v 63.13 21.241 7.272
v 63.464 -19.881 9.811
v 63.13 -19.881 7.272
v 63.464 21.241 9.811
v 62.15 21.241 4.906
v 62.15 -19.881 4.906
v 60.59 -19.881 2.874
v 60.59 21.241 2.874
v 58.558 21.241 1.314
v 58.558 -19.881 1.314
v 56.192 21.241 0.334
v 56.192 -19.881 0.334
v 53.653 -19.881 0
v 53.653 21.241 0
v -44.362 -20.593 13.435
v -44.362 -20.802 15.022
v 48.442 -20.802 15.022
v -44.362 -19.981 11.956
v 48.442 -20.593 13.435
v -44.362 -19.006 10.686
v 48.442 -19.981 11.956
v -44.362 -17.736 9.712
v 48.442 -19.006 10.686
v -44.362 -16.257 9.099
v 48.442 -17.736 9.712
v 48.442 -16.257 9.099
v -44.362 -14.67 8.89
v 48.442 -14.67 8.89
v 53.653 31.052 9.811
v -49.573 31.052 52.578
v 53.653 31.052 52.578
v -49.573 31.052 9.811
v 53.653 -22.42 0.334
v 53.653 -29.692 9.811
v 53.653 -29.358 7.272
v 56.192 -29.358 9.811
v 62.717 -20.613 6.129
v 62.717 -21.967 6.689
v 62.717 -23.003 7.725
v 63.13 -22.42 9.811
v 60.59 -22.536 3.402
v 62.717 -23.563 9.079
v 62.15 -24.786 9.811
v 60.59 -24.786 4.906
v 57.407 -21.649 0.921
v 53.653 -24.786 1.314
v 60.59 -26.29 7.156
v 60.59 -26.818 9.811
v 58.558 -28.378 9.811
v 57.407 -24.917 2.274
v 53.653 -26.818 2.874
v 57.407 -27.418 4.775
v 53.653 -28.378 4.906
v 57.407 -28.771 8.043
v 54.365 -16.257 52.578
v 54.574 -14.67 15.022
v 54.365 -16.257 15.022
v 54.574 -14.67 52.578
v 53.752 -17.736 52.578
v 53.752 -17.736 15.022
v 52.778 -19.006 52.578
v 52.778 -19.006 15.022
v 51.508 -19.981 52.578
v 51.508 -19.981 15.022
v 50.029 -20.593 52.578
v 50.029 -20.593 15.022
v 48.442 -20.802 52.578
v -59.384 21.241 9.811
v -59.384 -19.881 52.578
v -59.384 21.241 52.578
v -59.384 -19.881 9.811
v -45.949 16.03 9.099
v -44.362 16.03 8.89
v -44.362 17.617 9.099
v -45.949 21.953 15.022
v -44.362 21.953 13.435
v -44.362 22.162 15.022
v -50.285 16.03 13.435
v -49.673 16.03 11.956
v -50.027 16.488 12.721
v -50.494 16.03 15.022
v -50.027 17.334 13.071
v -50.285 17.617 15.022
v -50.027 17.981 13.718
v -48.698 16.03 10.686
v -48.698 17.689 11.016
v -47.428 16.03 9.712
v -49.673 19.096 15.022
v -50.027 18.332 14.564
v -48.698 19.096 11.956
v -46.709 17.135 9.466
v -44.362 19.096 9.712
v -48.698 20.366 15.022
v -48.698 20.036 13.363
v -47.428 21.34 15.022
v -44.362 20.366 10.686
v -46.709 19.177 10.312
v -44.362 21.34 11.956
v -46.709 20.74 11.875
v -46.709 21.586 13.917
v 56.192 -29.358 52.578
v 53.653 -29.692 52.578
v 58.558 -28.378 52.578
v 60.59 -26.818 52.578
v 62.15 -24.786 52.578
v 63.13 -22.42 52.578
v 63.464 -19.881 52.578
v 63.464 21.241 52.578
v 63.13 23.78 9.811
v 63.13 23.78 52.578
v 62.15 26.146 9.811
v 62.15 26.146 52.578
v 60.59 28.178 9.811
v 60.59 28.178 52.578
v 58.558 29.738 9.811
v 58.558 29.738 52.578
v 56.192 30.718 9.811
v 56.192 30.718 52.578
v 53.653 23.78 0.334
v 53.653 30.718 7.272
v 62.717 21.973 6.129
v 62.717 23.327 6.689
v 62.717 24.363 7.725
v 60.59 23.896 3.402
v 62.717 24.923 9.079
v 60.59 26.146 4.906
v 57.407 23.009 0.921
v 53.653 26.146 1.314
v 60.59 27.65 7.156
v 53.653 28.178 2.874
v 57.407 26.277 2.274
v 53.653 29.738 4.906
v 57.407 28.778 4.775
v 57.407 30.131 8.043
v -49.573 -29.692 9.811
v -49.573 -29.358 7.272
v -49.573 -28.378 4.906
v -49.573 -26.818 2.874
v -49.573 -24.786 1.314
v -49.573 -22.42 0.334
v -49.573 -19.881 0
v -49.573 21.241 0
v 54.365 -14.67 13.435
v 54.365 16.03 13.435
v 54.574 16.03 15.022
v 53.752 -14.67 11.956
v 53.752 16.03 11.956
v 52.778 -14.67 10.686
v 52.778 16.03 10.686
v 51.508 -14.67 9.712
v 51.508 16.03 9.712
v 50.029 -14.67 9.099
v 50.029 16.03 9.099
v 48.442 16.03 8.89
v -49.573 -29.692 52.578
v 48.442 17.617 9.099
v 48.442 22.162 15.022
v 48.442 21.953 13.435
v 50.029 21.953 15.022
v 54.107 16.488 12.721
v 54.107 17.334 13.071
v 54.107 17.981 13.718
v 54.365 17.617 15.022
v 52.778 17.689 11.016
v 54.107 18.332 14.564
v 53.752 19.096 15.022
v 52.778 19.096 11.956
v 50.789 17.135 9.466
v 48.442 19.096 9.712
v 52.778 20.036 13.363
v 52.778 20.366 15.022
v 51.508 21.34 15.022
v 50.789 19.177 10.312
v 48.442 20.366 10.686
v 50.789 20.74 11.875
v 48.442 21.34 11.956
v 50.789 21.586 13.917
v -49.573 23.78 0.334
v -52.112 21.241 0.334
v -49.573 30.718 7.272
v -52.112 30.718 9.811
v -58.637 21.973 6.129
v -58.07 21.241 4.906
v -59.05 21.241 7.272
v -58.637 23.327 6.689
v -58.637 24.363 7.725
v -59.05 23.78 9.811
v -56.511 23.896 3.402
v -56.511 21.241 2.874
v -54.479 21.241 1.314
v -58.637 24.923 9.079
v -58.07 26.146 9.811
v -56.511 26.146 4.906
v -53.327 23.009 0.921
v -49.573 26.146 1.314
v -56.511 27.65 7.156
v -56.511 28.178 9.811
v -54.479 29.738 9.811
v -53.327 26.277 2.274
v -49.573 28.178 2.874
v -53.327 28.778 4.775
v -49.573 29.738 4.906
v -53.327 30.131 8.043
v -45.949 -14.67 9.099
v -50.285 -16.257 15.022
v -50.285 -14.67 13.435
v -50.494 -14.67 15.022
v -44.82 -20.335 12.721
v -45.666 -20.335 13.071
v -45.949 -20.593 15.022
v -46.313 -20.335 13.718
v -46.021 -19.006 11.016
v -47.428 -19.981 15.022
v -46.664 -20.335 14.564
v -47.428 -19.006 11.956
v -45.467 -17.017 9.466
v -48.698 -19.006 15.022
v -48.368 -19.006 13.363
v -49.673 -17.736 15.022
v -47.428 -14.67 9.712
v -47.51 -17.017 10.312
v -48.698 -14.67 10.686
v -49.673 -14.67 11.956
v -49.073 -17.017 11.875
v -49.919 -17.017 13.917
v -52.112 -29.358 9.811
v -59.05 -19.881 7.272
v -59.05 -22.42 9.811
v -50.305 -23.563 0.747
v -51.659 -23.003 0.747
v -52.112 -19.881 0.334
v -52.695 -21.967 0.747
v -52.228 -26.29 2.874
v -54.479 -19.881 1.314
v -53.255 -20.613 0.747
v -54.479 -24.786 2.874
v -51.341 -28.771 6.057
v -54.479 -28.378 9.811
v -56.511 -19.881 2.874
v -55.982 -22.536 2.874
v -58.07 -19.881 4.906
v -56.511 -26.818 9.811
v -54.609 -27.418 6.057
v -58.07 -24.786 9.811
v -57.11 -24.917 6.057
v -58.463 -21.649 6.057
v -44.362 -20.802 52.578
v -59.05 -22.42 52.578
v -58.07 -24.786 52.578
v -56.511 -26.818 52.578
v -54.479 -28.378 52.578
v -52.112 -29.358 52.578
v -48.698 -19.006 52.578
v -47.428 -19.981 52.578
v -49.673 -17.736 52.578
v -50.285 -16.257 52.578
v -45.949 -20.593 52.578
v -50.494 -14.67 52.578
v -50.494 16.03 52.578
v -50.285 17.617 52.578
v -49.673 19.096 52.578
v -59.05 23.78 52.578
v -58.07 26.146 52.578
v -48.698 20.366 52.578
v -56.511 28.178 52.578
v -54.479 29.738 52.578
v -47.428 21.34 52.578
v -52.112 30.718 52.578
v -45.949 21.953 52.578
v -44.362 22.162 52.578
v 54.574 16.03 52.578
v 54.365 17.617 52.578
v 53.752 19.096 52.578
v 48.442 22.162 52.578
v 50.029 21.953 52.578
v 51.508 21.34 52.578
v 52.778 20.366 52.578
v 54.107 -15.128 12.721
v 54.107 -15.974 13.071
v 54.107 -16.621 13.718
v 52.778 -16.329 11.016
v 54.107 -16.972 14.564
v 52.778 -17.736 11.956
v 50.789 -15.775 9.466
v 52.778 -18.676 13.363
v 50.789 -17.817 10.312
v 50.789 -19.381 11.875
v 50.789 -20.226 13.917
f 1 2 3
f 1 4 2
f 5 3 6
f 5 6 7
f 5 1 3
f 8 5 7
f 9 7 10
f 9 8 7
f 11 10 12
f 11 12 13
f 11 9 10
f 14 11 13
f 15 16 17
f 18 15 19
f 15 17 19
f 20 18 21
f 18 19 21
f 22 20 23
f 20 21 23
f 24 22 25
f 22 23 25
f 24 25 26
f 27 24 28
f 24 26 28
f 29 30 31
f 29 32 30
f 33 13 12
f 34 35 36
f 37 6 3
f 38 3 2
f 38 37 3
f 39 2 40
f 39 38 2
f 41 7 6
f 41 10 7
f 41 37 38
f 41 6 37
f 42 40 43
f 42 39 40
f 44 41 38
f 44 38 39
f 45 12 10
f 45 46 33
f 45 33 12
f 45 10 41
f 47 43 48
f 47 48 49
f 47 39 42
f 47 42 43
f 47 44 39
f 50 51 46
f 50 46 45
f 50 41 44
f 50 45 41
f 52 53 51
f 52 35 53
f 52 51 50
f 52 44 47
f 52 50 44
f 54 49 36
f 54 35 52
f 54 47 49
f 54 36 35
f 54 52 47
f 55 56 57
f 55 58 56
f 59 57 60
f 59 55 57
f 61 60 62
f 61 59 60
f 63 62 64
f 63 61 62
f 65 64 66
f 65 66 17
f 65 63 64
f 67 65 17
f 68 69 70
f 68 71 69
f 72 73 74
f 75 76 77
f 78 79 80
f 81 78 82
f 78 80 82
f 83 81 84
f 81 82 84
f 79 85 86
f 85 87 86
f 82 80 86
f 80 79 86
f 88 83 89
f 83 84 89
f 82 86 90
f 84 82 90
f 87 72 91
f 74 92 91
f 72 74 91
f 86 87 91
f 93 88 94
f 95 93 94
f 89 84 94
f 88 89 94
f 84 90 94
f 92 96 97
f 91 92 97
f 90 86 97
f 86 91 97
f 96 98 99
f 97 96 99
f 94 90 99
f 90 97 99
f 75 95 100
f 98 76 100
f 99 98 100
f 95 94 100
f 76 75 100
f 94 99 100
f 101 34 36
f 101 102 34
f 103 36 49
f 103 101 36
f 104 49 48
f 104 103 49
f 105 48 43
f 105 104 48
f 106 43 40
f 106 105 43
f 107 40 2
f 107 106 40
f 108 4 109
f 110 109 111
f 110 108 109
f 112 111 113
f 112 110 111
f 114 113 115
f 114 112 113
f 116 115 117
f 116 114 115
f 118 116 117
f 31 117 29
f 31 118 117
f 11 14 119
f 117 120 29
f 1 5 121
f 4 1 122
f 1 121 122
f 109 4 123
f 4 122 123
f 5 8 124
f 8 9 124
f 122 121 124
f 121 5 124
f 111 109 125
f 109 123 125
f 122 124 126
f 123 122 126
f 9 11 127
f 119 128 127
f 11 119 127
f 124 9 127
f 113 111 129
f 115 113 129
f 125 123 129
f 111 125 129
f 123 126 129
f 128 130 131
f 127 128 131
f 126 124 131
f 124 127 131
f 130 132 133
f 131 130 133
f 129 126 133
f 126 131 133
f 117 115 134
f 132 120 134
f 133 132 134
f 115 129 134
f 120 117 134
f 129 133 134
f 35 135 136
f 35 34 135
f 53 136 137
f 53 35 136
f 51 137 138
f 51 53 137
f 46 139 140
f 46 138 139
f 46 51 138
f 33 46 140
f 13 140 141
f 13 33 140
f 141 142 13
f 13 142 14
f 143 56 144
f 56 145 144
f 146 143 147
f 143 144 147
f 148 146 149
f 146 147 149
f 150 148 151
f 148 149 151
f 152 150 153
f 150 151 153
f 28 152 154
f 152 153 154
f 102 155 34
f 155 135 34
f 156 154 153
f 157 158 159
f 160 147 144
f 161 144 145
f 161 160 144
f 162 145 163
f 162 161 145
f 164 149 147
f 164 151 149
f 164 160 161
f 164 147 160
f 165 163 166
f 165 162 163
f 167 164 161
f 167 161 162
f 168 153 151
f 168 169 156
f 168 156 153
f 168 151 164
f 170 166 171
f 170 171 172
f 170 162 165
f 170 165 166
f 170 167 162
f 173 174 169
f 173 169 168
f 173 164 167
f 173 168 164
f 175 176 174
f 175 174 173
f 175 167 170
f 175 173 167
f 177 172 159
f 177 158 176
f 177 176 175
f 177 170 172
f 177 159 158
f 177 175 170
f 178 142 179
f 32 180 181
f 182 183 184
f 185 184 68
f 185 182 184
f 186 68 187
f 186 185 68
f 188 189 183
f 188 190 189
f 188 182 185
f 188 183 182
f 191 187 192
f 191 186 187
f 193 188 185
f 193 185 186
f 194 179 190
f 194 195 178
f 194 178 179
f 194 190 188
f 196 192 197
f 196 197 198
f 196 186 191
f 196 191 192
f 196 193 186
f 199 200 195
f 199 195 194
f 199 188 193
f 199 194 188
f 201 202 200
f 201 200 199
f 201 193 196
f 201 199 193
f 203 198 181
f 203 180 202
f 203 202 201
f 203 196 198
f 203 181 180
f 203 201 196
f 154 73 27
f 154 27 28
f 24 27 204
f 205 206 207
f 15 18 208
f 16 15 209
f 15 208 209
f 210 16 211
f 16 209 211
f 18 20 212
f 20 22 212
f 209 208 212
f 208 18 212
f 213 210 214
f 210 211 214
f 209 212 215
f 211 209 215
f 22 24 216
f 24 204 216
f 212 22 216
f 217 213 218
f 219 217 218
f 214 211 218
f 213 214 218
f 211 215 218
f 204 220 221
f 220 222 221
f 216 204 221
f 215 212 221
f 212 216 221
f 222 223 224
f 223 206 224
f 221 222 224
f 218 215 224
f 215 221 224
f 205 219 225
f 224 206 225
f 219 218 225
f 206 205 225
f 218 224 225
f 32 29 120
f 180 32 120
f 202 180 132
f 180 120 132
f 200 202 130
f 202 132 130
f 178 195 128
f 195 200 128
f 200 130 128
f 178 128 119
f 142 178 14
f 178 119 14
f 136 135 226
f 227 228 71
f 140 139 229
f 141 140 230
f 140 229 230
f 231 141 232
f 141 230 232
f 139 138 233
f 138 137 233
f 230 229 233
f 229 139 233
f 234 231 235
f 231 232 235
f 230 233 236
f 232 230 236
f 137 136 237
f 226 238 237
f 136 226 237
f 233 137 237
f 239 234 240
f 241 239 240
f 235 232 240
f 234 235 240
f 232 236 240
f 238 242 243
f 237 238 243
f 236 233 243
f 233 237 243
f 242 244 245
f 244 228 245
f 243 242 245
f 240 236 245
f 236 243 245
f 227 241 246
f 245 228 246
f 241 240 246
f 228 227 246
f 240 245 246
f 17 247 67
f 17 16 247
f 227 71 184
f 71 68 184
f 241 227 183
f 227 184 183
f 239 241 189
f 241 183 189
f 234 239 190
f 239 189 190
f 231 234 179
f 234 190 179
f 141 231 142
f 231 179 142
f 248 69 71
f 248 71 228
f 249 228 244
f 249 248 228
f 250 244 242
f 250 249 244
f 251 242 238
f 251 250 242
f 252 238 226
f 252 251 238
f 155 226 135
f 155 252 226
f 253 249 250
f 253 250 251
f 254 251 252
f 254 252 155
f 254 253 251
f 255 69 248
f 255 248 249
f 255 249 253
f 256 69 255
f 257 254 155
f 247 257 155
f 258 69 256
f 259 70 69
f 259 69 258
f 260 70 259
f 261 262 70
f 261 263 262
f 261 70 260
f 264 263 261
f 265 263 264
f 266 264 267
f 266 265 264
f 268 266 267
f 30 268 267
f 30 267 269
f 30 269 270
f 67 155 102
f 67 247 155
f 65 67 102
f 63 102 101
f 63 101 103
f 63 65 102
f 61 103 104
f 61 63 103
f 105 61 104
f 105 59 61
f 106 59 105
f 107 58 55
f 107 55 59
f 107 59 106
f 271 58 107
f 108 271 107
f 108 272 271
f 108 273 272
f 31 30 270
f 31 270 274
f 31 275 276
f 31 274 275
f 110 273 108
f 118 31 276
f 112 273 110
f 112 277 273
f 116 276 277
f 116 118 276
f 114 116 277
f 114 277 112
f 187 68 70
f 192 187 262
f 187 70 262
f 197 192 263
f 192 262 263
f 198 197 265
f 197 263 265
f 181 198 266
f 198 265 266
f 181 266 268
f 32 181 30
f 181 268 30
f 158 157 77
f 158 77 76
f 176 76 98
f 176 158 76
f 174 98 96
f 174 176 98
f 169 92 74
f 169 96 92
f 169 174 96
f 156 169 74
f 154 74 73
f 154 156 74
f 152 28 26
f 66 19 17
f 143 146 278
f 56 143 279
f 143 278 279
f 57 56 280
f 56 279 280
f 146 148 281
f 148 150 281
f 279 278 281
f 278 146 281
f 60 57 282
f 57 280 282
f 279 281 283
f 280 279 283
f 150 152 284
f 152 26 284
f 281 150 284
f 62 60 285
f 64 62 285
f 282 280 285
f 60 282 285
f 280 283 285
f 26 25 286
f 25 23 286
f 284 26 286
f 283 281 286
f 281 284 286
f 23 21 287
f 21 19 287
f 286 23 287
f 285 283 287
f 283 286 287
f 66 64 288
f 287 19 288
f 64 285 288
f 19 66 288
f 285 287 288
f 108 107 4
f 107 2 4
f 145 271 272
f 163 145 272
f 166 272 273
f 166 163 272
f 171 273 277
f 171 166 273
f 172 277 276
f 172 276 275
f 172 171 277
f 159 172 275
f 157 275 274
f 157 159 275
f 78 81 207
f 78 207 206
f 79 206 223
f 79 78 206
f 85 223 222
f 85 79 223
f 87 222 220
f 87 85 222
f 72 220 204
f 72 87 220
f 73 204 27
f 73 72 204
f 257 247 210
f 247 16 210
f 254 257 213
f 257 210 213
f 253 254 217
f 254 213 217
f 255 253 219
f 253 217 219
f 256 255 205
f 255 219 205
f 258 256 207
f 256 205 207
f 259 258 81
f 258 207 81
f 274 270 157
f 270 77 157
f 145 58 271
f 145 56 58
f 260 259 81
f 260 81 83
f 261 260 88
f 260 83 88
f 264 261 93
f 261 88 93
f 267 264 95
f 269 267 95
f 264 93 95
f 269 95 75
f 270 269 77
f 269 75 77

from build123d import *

# Parameters (mm, degrees)
F0_W     = 122.8482164443
F0_H     = 60.7441384345
F1_DEPTH = 52.578
F2_T     = -8.89
F3_R     = 9.8113639175
F4_R     = 6.1321024484


with BuildPart() as f1:
    # F0 (on Top) → F1 (new body)
    with BuildSketch(Plane.XY):
        with Locations((2.0399149507, 0.6799725816)):
            Rectangle(F0_W, F0_H)
    extrude(amount=F1_DEPTH)

    # F2
    f2_openings = [f1.faces().sort_by_distance(p)[0] for p in [
        (2.039915, 0.679973, 52.578),
    ]]
    offset(amount=F2_T, openings=f2_openings)

    # F3
    f3_edges = [f1.edges().sort_by_distance(p)[0] for p in [
        (-59.384193, -29.692097, 26.289),
        (2.039915, -29.692097, 0),
        (2.039915, 31.052042, 0),
        (-59.384193, 0.679973, 0),
        (63.464023, 0.679973, 0),
        (-59.384193, 31.052042, 26.289),
        (63.464023, 31.052042, 26.289),
        (63.464023, -29.692097, 26.289),
    ]]
    fillet(f3_edges, radius=F3_R)

    # F4
    f4_edges = [f1.edges().sort_by_distance(p)[0] for p in [
        (2.039915, 22.162042, 8.89),
        (-50.494193, 0.679973, 8.89),
        (2.039915, -20.802097, 8.89),
        (54.574023, 0.679973, 8.89),
        (-50.494193, -20.802097, 30.734),
        (-50.494193, 22.162042, 30.734),
        (54.574023, -20.802097, 30.734),
        (54.574023, 22.162042, 30.734),
    ]]
    fillet(f4_edges, radius=F4_R)


solid = f1.part
